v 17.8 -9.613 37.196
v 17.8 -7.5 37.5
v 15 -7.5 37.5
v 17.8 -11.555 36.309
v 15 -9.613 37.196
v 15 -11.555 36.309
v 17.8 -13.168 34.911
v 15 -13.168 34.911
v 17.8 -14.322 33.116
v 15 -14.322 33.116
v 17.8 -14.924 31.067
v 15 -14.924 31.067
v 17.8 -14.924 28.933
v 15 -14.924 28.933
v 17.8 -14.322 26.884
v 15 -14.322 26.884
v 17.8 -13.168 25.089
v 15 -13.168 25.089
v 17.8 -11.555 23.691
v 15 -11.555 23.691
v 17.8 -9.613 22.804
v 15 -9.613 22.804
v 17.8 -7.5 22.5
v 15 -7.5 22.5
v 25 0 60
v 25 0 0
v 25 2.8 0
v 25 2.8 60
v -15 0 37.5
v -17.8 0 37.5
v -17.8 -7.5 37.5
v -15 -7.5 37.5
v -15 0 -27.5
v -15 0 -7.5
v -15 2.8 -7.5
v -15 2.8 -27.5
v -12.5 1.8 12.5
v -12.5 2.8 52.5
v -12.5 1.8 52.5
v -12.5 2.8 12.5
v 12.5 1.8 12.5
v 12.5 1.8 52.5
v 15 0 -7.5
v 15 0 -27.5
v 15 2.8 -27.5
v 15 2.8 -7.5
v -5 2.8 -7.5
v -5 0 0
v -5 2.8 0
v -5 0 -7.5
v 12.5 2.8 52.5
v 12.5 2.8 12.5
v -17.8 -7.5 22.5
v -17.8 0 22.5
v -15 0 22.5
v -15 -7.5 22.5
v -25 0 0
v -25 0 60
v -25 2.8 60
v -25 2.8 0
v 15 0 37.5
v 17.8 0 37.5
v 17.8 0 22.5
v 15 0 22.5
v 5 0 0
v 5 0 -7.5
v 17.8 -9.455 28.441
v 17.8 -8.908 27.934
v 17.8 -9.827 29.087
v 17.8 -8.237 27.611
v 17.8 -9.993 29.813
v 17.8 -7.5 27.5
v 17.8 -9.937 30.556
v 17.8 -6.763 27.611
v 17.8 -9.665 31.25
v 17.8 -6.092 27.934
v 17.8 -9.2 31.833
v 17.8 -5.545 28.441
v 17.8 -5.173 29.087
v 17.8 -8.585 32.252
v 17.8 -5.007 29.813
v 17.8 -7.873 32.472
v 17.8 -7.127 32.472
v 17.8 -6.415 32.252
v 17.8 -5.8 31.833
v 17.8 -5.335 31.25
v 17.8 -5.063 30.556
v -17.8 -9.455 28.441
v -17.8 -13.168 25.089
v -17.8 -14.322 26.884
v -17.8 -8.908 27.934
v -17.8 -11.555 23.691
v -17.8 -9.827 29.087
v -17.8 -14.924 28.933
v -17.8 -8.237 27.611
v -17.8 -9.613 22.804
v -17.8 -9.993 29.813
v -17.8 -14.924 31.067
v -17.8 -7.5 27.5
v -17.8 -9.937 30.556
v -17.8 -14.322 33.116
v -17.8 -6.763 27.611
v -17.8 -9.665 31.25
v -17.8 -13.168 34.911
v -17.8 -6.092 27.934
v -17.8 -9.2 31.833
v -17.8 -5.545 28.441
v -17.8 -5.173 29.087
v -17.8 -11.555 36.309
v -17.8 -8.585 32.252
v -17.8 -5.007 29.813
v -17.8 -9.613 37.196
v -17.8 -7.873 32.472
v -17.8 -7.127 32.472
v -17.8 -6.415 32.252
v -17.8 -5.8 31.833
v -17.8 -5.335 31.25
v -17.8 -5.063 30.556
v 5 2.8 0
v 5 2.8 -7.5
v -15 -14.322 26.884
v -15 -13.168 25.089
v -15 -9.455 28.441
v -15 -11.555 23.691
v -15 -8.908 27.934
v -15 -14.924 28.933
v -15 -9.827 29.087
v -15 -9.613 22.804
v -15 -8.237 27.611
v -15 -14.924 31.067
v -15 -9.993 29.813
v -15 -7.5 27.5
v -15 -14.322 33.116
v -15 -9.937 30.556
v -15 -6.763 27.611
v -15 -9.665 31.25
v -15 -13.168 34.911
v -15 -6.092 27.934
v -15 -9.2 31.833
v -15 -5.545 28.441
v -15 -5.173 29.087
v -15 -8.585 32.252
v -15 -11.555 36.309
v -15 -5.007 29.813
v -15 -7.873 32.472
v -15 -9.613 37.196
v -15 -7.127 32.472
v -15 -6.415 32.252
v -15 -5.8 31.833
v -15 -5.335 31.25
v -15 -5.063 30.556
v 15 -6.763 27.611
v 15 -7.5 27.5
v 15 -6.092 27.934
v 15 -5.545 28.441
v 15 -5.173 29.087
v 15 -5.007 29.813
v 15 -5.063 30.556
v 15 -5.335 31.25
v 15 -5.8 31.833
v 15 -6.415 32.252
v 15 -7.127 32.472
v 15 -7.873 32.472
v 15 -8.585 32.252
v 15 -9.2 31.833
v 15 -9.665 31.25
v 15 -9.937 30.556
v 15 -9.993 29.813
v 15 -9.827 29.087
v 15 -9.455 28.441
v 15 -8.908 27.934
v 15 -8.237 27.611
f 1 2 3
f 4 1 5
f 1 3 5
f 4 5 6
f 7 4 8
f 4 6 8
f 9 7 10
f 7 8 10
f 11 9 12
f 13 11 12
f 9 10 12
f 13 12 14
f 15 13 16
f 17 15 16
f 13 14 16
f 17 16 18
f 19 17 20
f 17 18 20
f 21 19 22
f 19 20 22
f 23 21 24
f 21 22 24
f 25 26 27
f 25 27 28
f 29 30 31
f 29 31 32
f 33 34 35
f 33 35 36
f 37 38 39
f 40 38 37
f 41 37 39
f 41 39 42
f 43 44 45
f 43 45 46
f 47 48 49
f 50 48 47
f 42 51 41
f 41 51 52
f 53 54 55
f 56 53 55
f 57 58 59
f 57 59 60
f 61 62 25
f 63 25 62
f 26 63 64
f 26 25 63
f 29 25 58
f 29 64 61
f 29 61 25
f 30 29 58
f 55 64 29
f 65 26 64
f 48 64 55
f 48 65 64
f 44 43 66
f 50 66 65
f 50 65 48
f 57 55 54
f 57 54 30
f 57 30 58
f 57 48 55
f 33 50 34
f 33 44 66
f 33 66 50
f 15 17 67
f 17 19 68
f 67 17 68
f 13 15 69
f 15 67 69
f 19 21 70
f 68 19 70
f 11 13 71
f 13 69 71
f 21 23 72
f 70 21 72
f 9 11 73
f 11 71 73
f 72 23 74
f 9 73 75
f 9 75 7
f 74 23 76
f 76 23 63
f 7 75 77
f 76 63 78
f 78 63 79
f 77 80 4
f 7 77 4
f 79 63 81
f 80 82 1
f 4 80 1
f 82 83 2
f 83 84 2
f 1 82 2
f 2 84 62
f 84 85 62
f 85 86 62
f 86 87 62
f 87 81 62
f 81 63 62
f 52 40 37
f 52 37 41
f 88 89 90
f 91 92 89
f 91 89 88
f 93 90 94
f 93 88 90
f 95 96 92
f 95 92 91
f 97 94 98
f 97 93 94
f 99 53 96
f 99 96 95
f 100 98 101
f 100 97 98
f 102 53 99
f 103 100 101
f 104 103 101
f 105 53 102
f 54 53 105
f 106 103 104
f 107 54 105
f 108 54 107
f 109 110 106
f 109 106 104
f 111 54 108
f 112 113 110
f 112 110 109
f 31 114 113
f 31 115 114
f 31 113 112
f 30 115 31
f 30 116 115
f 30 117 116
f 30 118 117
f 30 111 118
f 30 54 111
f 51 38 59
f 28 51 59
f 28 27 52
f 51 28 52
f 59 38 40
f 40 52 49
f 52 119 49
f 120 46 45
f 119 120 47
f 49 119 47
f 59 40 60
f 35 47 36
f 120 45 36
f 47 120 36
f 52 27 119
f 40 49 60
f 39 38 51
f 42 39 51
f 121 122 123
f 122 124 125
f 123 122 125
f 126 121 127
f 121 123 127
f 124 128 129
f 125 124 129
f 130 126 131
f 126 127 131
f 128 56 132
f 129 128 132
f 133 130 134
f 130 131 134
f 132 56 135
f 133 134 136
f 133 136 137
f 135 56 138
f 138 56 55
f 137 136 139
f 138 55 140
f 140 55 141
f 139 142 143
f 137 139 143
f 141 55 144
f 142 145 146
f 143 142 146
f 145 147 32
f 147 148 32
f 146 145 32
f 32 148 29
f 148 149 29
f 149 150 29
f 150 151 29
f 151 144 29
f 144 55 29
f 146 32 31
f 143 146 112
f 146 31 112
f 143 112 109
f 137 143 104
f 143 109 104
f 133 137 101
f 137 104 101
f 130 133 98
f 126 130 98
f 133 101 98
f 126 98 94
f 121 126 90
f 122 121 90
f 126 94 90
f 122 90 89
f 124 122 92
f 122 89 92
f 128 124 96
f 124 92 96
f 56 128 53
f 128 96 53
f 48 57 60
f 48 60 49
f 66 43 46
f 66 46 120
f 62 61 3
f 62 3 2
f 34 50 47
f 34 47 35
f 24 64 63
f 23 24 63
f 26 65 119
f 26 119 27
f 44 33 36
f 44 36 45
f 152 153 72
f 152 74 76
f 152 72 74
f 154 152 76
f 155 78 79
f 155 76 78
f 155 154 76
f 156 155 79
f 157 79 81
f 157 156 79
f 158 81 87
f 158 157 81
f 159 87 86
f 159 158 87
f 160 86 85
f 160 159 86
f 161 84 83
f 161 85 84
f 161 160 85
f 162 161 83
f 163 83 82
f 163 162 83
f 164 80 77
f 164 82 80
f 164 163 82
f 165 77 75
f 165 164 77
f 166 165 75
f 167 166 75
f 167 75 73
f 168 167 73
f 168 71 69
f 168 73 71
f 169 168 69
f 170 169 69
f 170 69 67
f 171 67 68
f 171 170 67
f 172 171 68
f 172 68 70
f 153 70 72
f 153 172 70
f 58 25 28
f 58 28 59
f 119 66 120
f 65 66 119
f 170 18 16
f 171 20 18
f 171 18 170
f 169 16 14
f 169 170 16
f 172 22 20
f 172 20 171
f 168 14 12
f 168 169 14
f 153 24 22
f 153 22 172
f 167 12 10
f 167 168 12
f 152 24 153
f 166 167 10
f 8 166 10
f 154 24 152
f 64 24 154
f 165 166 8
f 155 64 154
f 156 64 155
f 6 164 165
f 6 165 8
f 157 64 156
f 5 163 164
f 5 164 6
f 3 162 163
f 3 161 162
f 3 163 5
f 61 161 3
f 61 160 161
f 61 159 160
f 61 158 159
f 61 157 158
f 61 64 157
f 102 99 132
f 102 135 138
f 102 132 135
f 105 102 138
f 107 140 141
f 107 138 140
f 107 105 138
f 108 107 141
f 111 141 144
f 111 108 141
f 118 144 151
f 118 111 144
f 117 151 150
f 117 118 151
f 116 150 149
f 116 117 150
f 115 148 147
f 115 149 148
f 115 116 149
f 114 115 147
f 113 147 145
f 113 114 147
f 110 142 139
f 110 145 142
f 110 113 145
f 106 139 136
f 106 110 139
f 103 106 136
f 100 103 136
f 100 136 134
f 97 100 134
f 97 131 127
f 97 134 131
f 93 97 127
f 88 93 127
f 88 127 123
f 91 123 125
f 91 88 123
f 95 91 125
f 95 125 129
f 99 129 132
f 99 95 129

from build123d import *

# Parameters (mm, degrees)
BOSS_EXTRUDE1_DEPTH     = 2.8
SKETCH3_W               = 25
SKETCH3_H               = 40
CUT_EXTRUDE1_DEPTH      = 1
SKETCH4_W               = 2.8
SKETCH4_H               = 15
BOSS_EXTRUDE2_DEPTH     = 15
CUT_EXTRUDE2_DEPTH      = 76.211967133
CUT_EXTRUDE2_DEPTH_BACK = 76.211967133
SKETCH5_R               = 2.5


with BuildPart() as part:
    # Sketch2 → Boss-Extrude1 (new body)
    with BuildSketch(Plane(origin=(0, 0, 0), x_dir=(1, 0, 0), z_dir=(0, 1, 0))):
        Polygon((-15, 27.5), (15, 27.5), (15, 7.5), (5, 7.5), (5, 0), (25, 0), (25, -60), (-25, -60), (-25, 0), (-5, 0), (-5, 7.5), (-15, 7.5), align=None)
    extrude(amount=BOSS_EXTRUDE1_DEPTH)

    # Sketch3 → Cut-Extrude1 (cut)
    with BuildSketch(Plane(origin=(0, 2.8, 0), x_dir=(1, 0, 0), z_dir=(0, 1, 0))):
        with Locations((0, -32.5)):
            Rectangle(SKETCH3_W, SKETCH3_H)
    extrude(amount=-CUT_EXTRUDE1_DEPTH, mode=Mode.SUBTRACT)

    # Sketch4 → Boss-Extrude2 (add)
    with BuildSketch(Plane.XZ):
        with Locations((16.4, 30)):
            Rectangle(SKETCH4_W, SKETCH4_H)
        with Locations((-16.4, 30)):
            Rectangle(SKETCH4_W, SKETCH4_H)
    extrude(amount=BOSS_EXTRUDE2_DEPTH)

    # Sketch5 → Cut-Extrude2 (cut, two sides: drawn at the far end of the back side and taken through both)
    with BuildSketch(Plane(origin=(17.8, 0, 0), x_dir=(0, 0, -1), z_dir=(1, 0, 0)).offset(-CUT_EXTRUDE2_DEPTH_BACK)):
        with Locations((-30, -7.5)):
            Circle(SKETCH5_R)
        with BuildLine():
            Line((-22.5, -16.5), (-37.5, -16.5))
            Line((-37.5, -16.5), (-37.5, -7.5))
            ThreePointArc((-37.5, -7.5), (-30, -15), (-22.5, -7.5))
            Line((-22.5, -7.5), (-22.5, -16.5))
        make_face()
    extrude(amount=CUT_EXTRUDE2_DEPTH + CUT_EXTRUDE2_DEPTH_BACK, mode=Mode.SUBTRACT)


solid = part.part
